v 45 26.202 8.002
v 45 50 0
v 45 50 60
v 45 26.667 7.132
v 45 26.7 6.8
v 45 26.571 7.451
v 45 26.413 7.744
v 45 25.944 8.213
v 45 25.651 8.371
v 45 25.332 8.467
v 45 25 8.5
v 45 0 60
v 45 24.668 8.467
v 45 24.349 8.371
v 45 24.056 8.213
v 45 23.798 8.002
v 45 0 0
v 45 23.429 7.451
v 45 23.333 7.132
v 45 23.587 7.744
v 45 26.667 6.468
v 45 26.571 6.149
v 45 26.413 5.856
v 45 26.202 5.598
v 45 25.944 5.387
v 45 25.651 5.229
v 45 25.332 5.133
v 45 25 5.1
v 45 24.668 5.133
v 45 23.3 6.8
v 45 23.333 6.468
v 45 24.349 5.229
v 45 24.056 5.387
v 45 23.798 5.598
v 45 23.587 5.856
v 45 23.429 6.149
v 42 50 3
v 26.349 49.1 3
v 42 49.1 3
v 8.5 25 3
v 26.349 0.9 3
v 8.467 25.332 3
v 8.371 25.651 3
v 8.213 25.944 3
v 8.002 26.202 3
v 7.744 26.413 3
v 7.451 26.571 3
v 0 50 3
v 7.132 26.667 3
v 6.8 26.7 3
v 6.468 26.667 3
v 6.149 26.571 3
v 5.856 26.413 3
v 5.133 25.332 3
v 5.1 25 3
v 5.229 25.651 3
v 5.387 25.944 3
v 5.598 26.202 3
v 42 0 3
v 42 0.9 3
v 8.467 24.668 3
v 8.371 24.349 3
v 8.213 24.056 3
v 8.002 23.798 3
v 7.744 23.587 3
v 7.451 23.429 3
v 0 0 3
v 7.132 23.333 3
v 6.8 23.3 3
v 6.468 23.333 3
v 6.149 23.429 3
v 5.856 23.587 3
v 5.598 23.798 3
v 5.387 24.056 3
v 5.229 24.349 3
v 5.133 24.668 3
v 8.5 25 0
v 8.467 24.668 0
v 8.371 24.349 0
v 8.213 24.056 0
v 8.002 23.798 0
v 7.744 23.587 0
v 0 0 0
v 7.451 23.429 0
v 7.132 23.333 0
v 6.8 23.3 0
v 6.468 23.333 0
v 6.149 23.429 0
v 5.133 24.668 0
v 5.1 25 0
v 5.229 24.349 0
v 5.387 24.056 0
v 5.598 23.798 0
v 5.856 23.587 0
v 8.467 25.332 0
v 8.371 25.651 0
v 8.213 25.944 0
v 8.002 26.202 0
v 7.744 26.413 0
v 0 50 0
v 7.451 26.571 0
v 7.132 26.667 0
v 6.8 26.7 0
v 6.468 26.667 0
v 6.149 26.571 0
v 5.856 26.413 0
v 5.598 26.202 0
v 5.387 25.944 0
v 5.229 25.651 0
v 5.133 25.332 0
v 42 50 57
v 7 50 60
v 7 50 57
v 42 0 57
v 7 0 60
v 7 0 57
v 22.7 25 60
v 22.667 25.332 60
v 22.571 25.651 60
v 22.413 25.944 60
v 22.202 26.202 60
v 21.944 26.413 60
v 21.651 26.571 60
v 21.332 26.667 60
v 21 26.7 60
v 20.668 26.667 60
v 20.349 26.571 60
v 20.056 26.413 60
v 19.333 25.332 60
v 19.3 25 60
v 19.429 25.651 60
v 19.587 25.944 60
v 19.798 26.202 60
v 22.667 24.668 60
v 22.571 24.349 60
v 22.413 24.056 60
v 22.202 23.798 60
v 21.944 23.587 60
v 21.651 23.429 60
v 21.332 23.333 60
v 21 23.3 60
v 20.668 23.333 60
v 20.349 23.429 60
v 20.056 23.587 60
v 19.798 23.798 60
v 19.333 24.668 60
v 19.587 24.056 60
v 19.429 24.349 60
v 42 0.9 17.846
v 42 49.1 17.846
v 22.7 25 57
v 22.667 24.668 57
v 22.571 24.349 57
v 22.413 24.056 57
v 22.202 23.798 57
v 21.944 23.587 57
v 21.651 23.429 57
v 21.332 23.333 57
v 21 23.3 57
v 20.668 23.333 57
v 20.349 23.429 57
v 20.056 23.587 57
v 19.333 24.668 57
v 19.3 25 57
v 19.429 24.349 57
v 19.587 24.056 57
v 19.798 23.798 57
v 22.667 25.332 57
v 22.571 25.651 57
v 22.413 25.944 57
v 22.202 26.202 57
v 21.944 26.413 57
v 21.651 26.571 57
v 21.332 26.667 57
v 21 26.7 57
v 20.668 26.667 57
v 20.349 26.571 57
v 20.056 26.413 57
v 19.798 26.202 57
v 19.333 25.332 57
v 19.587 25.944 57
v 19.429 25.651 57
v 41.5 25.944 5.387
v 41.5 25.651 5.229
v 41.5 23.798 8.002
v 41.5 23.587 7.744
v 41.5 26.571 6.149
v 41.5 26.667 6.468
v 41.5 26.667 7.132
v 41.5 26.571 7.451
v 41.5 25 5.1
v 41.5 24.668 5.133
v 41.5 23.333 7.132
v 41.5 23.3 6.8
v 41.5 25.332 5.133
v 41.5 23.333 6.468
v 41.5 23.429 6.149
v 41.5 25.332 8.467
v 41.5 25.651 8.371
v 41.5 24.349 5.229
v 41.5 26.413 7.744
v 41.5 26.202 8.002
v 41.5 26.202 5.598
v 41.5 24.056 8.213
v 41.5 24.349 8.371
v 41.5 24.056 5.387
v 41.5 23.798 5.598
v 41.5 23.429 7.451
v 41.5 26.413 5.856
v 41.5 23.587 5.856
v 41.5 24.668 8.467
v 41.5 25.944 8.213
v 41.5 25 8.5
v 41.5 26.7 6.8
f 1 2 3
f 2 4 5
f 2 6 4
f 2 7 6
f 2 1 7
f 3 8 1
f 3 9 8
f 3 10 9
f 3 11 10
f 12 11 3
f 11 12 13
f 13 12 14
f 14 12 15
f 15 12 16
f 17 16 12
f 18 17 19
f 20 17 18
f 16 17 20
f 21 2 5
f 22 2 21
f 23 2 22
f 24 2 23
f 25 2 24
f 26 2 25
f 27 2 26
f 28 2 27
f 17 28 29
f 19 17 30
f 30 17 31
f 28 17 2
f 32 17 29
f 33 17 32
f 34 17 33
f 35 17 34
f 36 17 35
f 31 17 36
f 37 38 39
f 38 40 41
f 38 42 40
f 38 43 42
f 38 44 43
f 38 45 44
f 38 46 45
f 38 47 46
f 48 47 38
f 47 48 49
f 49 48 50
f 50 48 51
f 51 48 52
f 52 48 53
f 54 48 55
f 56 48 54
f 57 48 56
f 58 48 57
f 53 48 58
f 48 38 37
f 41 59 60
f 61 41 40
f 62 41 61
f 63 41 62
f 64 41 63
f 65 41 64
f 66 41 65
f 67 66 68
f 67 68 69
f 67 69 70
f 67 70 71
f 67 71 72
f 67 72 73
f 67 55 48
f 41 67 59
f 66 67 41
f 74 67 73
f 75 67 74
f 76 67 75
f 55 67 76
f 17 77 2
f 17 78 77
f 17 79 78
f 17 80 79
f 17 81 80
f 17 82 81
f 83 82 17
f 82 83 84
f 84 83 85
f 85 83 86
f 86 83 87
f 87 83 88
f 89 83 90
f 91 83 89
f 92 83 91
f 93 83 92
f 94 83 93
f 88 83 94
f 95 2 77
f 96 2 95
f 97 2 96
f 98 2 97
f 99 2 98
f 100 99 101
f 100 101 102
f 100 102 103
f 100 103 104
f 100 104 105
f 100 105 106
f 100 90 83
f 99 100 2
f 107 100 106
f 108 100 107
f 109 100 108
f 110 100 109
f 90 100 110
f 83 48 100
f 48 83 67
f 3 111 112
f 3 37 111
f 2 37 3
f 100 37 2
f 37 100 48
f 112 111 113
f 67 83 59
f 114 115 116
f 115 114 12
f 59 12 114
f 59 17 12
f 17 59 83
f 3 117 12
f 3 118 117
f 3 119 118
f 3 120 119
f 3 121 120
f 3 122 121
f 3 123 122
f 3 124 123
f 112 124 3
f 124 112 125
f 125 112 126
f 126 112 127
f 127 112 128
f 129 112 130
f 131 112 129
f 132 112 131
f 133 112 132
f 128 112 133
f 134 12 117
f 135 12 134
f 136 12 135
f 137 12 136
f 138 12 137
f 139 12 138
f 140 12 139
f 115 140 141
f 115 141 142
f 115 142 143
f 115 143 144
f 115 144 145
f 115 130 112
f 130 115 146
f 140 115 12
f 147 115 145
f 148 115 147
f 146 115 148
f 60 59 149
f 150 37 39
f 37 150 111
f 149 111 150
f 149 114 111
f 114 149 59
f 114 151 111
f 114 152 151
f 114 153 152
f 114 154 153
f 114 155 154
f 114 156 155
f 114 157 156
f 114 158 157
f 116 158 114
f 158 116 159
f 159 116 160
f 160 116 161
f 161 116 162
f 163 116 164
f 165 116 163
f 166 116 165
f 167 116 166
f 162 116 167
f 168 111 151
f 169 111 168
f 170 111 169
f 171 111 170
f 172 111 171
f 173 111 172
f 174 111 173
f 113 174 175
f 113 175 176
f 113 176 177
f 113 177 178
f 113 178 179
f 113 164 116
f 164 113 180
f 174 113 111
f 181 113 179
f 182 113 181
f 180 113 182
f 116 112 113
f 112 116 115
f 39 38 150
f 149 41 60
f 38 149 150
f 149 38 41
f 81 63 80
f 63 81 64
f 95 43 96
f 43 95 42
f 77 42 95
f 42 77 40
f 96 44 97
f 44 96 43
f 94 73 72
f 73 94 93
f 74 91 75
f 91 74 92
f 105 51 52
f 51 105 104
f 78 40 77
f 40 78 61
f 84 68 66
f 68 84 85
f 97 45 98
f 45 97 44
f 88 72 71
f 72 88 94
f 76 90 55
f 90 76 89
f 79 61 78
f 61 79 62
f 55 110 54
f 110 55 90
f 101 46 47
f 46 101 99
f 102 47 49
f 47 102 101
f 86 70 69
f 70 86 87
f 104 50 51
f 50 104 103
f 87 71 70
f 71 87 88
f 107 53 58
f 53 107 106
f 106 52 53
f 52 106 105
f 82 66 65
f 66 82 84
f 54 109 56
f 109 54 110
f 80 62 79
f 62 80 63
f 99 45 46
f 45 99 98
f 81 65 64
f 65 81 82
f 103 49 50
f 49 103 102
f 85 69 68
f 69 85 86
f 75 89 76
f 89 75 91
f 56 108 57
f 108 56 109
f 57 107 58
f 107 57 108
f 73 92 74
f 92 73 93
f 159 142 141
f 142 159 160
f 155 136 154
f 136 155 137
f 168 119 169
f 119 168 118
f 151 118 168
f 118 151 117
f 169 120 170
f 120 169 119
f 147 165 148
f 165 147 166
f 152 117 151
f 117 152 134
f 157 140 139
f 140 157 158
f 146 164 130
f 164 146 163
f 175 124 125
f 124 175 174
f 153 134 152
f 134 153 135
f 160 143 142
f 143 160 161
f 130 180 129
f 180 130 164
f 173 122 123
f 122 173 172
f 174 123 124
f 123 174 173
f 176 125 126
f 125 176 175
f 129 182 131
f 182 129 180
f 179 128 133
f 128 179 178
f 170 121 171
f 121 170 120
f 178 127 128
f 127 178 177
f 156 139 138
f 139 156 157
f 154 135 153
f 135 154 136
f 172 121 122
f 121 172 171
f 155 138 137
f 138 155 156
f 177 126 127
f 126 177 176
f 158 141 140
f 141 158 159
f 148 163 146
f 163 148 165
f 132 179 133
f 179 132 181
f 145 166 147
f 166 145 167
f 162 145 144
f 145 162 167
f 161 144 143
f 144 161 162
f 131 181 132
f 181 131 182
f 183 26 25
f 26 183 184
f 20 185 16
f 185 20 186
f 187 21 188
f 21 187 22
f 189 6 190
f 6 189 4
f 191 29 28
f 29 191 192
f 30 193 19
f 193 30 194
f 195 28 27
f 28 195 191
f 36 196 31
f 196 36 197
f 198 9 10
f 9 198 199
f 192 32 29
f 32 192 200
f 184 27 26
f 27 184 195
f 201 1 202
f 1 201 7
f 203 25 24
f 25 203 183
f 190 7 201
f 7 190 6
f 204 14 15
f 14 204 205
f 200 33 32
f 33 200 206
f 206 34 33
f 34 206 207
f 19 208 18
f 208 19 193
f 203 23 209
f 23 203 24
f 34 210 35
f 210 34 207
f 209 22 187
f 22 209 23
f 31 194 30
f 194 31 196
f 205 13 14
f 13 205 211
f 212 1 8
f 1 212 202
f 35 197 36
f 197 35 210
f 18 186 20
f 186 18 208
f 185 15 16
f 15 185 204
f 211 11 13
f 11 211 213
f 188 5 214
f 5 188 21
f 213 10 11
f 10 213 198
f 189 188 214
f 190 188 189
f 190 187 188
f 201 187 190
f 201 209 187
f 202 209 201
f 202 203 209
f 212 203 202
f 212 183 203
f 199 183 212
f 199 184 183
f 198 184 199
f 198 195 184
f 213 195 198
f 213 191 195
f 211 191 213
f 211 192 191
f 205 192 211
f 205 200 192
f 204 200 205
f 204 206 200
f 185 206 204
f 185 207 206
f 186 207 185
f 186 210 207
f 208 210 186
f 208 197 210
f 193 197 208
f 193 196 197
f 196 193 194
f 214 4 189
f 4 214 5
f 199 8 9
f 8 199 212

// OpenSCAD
$fn = 32;

// ----------------------------------------------------------------------
// Z-bracket: 45 x 50 x 60 mm
// ----------------------------------------------------------------------

// --- parameters (mm) ---
foot_len = 45;            // lower foot length, X
top_len = 35;             // upper foot length, X
depth = 50;               // bracket width, Y
step_h = 60;              // overall rise, Z
plate_t = 3;              // plate thickness
hole_d = 3.4;             // clearance for M3
rib_len = 16.6;           // gusset leg
rib_sink = 0.9;           // gusset overlap into the plates

module hole_z(px, py, z0) {
  translate([px, py, z0 - 0.5]) cylinder(h = plate_t + 1, d = hole_d);
}
module hole_x(py, pz) {
  translate([-0.5, py, pz]) rotate([0, 90, 0]) cylinder(h = plate_t + 1, d = hole_d);
}
module gusset(x0) {
  translate([x0, depth - rib_sink, 0])
    rotate([90, 0, 0])
      linear_extrude(height = depth - 2 * rib_sink)
        polygon(points = [[rib_sink, plate_t - rib_sink],
                          [rib_sink, plate_t - rib_sink + rib_len],
                          [-rib_len, plate_t - rib_sink]]);
}

difference() {
  union() {
    cube([foot_len, depth, plate_t]);
    /* web, overlapping the lower foot */
    translate([foot_len - plate_t, 0, 0]) cube([plate_t, depth, step_h]);
    /* upper foot, sunk into the web */
    translate([foot_len - plate_t - top_len, 0, step_h - plate_t]) cube([top_len + plate_t, depth, plate_t]);
    gusset(foot_len - plate_t);
  }
  hole_z(6.8, 25, 0);
  translate([foot_len - plate_t - 21, 0, 0]) hole_z(0, 25, step_h - plate_t);
  translate([foot_len - plate_t, 0, 0]) hole_x(25, 6.8);
}
